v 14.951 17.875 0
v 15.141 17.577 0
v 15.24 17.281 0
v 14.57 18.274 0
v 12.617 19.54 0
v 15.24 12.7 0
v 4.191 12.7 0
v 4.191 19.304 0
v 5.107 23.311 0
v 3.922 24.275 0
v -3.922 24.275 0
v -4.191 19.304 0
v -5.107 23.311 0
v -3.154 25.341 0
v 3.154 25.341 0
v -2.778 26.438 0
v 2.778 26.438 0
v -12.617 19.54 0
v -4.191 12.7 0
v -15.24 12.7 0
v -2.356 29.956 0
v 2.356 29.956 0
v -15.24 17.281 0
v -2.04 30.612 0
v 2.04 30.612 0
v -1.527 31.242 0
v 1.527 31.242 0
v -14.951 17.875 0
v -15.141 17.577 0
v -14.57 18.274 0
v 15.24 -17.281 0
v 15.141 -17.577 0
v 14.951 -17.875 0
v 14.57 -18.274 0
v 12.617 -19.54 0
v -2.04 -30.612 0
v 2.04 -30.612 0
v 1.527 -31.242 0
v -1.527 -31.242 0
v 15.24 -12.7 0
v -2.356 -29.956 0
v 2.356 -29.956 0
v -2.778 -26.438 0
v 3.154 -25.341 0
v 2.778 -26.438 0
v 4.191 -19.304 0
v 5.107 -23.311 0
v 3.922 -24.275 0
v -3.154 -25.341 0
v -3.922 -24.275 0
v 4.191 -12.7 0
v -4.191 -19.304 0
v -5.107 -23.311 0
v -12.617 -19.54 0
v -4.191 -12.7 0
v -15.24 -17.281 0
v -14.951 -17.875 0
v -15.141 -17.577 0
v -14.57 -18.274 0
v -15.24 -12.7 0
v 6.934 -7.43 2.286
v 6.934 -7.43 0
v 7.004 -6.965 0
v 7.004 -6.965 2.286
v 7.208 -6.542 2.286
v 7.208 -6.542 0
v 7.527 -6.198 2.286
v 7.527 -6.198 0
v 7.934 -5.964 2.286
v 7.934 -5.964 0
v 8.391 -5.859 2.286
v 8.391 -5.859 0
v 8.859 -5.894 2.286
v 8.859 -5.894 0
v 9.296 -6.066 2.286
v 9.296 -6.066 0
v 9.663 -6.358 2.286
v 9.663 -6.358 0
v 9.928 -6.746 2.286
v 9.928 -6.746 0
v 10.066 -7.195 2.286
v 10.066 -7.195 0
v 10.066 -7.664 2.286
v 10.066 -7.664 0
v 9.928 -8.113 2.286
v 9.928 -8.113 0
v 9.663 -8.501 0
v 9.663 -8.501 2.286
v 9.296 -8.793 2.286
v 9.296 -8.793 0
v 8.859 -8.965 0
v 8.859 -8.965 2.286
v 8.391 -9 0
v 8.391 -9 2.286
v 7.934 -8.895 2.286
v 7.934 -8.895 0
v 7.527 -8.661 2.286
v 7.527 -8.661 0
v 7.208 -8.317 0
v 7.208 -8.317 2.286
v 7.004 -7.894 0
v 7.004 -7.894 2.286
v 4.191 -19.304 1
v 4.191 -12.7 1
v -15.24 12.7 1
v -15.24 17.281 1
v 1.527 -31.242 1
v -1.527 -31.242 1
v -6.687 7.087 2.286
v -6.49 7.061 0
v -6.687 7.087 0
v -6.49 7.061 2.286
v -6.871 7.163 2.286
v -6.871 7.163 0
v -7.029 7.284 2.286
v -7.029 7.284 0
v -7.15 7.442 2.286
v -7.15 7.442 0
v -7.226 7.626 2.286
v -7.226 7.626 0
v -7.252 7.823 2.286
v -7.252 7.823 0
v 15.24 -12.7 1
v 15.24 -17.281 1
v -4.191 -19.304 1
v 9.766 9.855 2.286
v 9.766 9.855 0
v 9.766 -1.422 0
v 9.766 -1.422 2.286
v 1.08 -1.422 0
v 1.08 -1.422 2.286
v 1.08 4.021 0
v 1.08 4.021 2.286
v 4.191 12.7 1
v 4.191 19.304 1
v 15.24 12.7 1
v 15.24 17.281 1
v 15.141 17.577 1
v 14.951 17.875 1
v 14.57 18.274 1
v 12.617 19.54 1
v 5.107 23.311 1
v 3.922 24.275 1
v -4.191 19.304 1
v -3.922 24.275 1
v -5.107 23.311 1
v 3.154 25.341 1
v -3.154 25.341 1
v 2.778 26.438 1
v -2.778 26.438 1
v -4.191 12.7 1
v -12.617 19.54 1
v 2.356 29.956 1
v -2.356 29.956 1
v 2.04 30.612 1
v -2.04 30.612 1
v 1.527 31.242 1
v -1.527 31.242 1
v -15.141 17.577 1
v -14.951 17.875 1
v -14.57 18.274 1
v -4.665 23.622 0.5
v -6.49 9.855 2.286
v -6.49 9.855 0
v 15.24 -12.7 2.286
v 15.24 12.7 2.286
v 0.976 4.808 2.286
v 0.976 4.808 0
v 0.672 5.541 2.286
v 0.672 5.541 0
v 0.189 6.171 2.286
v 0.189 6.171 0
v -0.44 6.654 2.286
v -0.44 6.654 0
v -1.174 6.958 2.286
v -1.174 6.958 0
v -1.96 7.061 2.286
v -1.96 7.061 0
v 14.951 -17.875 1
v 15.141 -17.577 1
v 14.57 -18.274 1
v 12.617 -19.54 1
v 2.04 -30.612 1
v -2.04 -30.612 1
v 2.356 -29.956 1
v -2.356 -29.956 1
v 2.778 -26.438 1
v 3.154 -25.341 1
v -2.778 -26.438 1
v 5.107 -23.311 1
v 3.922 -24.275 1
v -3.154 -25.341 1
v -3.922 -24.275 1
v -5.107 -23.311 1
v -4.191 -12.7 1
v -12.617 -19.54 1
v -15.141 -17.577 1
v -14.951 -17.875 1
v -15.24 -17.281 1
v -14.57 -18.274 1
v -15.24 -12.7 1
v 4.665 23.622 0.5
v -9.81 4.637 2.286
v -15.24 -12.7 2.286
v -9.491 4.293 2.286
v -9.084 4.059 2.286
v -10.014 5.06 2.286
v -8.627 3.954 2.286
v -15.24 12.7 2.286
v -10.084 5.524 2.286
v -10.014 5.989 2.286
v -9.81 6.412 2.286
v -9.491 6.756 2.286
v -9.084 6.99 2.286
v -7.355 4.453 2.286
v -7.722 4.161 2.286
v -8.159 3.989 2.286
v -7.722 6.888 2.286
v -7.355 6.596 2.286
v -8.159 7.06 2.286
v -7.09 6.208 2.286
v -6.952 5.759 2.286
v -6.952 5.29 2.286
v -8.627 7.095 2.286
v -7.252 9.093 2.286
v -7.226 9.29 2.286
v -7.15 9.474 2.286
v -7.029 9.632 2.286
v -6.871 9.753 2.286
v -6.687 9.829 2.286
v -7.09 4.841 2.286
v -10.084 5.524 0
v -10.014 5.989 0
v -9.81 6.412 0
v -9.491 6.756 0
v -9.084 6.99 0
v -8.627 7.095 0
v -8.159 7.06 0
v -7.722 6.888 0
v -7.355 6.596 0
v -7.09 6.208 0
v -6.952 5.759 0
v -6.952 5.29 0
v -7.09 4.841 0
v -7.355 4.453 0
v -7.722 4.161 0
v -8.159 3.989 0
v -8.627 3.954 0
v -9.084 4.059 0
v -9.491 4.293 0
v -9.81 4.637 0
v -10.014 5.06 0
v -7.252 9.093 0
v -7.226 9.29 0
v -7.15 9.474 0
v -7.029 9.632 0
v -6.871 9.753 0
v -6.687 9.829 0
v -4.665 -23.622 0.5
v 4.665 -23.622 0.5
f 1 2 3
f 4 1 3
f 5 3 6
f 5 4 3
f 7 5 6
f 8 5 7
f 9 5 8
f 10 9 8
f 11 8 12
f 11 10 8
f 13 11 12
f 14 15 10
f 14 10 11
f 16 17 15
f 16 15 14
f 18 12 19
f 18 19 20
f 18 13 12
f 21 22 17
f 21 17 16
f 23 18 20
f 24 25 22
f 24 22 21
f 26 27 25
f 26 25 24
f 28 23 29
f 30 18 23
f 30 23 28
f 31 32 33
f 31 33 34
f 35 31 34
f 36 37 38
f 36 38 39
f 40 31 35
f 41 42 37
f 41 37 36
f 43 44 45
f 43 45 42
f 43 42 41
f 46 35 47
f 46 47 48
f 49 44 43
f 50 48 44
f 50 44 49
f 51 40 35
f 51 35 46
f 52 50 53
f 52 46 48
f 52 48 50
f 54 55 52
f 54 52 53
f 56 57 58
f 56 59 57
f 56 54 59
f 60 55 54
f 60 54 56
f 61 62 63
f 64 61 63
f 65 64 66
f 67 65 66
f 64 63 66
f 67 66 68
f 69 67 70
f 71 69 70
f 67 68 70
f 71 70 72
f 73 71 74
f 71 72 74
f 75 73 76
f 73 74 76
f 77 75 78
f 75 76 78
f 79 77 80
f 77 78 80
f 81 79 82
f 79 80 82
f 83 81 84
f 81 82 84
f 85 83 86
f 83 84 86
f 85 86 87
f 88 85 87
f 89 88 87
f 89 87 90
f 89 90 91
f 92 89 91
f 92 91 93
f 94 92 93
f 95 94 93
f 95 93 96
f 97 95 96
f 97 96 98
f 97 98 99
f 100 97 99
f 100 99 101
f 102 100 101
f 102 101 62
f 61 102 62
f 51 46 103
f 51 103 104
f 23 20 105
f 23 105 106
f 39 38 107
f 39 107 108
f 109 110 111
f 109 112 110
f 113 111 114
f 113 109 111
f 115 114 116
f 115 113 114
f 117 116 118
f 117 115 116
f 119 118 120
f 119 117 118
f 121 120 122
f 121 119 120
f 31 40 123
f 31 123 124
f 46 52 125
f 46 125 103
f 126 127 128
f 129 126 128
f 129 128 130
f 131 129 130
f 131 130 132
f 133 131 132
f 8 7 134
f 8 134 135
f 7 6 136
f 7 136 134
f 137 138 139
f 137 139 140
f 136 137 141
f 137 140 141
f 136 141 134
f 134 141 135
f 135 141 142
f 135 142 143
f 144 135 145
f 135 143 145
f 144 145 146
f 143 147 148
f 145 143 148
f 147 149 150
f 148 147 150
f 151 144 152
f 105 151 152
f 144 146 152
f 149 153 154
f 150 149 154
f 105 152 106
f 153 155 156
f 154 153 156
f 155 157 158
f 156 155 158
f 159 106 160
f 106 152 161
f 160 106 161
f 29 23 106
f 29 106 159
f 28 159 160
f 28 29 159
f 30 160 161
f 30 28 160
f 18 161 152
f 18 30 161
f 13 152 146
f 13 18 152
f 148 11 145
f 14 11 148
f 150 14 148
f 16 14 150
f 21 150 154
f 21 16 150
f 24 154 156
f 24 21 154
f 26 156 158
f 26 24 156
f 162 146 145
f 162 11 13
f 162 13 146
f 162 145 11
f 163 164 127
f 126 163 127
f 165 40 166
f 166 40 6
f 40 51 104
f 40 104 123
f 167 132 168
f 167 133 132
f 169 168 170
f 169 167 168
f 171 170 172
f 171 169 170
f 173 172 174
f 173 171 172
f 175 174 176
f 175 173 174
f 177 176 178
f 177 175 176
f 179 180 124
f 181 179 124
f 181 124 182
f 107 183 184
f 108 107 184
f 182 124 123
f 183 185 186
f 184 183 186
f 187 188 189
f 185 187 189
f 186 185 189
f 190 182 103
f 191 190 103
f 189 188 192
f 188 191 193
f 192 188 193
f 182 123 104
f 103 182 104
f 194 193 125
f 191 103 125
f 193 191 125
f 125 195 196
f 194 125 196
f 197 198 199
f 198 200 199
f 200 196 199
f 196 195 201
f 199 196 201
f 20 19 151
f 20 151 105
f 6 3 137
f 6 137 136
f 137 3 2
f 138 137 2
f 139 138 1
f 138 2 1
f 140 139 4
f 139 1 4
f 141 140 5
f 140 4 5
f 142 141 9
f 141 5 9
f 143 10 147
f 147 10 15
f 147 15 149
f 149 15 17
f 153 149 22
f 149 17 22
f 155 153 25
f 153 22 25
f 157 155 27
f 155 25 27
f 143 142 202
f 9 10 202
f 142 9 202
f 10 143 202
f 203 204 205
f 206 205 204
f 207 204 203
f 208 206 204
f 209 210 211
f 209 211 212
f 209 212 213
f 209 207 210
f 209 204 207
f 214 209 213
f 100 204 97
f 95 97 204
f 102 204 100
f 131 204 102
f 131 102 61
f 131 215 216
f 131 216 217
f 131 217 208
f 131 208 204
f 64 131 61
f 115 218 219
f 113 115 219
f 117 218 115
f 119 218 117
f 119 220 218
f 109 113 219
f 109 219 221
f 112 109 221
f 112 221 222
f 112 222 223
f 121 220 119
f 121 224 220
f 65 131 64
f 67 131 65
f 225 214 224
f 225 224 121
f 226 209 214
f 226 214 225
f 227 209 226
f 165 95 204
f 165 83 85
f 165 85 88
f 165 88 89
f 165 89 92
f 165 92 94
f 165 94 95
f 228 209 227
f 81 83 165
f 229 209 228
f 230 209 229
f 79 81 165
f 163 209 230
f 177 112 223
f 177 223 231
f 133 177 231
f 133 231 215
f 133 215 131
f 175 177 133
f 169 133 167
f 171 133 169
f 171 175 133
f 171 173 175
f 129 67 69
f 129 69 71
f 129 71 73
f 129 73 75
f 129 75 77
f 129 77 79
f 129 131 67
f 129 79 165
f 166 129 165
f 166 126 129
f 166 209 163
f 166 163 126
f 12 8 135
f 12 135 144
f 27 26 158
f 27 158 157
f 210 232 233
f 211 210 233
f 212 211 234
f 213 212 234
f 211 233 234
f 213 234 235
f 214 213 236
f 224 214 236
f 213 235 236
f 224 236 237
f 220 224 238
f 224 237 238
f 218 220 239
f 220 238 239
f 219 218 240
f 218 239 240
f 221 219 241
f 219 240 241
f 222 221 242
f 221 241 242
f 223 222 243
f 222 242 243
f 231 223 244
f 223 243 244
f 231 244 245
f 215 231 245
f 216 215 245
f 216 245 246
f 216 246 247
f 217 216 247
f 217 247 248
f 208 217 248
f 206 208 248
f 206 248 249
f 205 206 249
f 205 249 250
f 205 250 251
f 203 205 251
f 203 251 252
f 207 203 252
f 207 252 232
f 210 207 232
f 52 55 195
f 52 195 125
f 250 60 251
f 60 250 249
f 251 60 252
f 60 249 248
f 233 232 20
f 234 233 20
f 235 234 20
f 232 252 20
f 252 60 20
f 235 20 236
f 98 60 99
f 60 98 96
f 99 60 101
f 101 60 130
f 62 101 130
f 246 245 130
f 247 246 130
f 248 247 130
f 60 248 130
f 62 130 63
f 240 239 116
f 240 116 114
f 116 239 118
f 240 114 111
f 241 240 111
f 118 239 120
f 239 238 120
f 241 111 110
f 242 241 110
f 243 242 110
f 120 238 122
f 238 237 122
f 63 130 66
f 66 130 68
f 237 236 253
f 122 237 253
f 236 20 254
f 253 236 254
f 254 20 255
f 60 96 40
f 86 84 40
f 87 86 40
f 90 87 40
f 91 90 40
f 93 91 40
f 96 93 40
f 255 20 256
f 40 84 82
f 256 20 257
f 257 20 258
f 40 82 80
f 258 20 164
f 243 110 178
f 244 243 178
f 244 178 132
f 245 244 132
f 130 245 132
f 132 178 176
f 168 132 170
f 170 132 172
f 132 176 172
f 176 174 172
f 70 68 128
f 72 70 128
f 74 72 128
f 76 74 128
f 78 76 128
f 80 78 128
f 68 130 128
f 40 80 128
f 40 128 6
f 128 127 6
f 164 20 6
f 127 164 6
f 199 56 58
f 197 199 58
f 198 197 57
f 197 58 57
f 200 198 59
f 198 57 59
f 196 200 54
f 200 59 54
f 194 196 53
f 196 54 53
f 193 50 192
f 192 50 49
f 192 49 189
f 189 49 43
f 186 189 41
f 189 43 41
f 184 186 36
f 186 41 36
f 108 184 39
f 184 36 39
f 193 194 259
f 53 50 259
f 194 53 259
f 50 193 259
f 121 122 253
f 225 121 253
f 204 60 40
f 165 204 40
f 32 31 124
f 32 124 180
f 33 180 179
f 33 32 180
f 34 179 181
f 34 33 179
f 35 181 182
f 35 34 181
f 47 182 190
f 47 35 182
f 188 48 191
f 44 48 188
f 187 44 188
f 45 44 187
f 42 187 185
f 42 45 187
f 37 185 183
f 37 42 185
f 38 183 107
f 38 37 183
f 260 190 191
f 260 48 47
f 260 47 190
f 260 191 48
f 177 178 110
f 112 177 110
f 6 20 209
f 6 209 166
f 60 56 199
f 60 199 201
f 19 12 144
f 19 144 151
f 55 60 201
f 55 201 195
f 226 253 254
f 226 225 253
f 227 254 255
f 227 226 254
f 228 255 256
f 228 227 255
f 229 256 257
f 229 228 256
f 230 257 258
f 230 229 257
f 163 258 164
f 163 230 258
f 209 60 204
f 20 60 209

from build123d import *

# Parameters (mm, degrees)
SKETCH2_W             = 30.48
SKETCH2_H             = 25.4
BOSS_EXTRUDE1_DEPTH   = 2.286
CUT_EXTRUDE2_REACH    = 4.286
SKETCH3_R             = 1.5748
BOSS_EXTRUDE5_DEPTH   = 1
BOSS_EXTRUDE5_2_DEPTH = 1
CUT_EXTRUDE3_DEPTH    = 1
FILLET4_R             = 3.04
FILLET5_R             = 0.762


with BuildPart() as part:
    # Sketch2 → Boss-Extrude1 (new body)
    with BuildSketch(Plane.XY):
        Rectangle(SKETCH2_W, SKETCH2_H)
    extrude(amount=BOSS_EXTRUDE1_DEPTH)

    # Sketch3 → Cut-Extrude2 (cut, up to next)
    with BuildSketch(Plane(origin=(0, 0, 0), x_dir=(-1, 0, 0), z_dir=(0, 0, -1)), mode=Mode.PRIVATE) as cut_extrude2_sk1:
        Polygon((-9.7663, -1.4224), (-1.0795, -1.4224), (-1.0795, 7.0612), (7.2517, 7.0612), (7.2517, 9.8552), (-9.7663, 9.8552), align=None)
    cut_extrude2_tool1 = extrude(cut_extrude2_sk1.sketch, amount=-CUT_EXTRUDE2_REACH, mode=Mode.PRIVATE) & part.part
    add(cut_extrude2_tool1.solids().sort_by_distance((3.789271, 5.030776, 0))[0], mode=Mode.SUBTRACT)
    # Sketch3 → Cut-Extrude2 (cut, up to next)
    with BuildSketch(Plane(origin=(0, 0, 0), x_dir=(-1, 0, 0), z_dir=(0, 0, -1)), mode=Mode.PRIVATE) as cut_extrude2_sk2:
        with Locations((8.509, 5.5245)):
            Circle(SKETCH3_R)
    cut_extrude2_tool2 = extrude(cut_extrude2_sk2.sketch, amount=-CUT_EXTRUDE2_REACH, mode=Mode.PRIVATE) & part.part
    add(cut_extrude2_tool2.solids().sort_by_distance((-8.509, 5.5245, 0))[0], mode=Mode.SUBTRACT)
    # Sketch3 → Cut-Extrude2 (cut, up to next)
    with BuildSketch(Plane(origin=(0, 0, 0), x_dir=(-1, 0, 0), z_dir=(0, 0, -1)), mode=Mode.PRIVATE) as cut_extrude2_sk3:
        with Locations((-8.509, -7.4295)):
            Circle(SKETCH3_R)
    cut_extrude2_tool3 = extrude(cut_extrude2_sk3.sketch, amount=-CUT_EXTRUDE2_REACH, mode=Mode.PRIVATE) & part.part
    add(cut_extrude2_tool3.solids().sort_by_distance((8.509, -7.4295, 0))[0], mode=Mode.SUBTRACT)

    # Fillet4
    fillet4_edges = [part.edges().sort_by_distance(p)[0] for p in [
        (1.0795, 7.0612, 1.143),
    ]]
    fillet(fillet4_edges, radius=FILLET4_R)

    # Fillet5
    fillet5_edges = [part.edges().sort_by_distance(p)[0] for p in [
        (-7.2517, 9.8552, 1.143),
        (-7.2517, 7.0612, 1.143),
    ]]
    fillet(fillet5_edges, radius=FILLET5_R)


with BuildPart() as body_2:
    # Sketch5 → Boss-Extrude5 (new body)
    with BuildSketch(Plane(origin=(0, 0, 0), x_dir=(-1, 0, 0), z_dir=(0, 0, -1))):
        Polygon((-15.24, 12.7), (-4.191, 12.7), (-4.191, 19.304), (4.191, 19.304), (4.191, 12.7), (15.24, 12.7), (15.24, 31.242), (-15.24, 31.242), align=None)
    extrude(amount=-BOSS_EXTRUDE5_DEPTH)


with BuildPart() as body_3:
    # Sketch5 → Boss-Extrude5 2 (new body)
    with BuildSketch(Plane(origin=(0, 0, 0), x_dir=(-1, 0, 0), z_dir=(0, 0, -1))):
        Polygon((15.24, -12.7), (4.191, -12.7), (4.191, -19.304), (-4.191, -19.304), (-4.191, -12.7), (-15.24, -12.7), (-15.24, -31.242), (15.24, -31.242), align=None)
    extrude(amount=-BOSS_EXTRUDE5_2_DEPTH)


with BuildPart() as cut_extrude3_tool:
    # Sketch6 → Cut-Extrude3 (new body)
    with BuildSketch(Plane(origin=(0, 0, 0), x_dir=(-1, 0, 0), z_dir=(0, 0, -1))):
        with BuildLine():
            Line((15.24, -17.280759688), (15.24, -31.242))
            Line((15.24, -31.242), (1.526938678, -31.242))
            add(Edge.make_bspline(
                [(15.24, -17.280759688), (14.890369571, -19.309691675), (-1.001421423, -23.881680442), (3.798810701, -29.015705658), (1.526938678, -31.242)],
                knots=[0, 0, 0, 0, 0.458669995, 1, 1, 1, 1], degree=3))
        make_face()
        with BuildLine():
            Line((-15.24, -31.242), (-1.526938678, -31.242))
            add(Edge.make_bspline(
                [(-15.24, -17.280759688), (-14.890369571, -19.309691675), (1.001421423, -23.881680442), (-3.798810701, -29.015705658), (-1.526938678, -31.242)],
                knots=[0, 0, 0, 0, 0.458669995, 1, 1, 1, 1], degree=3))
            Line((-15.24, -17.280759688), (-15.24, -31.242))
        make_face()
        with BuildLine():
            Line((-15.24, 17.280759688), (-15.24, 31.242))
            Line((-15.24, 31.242), (-1.526938678, 31.242))
            add(Edge.make_bspline(
                [(-15.24, 17.280759688), (-14.890369571, 19.309691675), (1.001421423, 23.881680442), (-3.798810701, 29.015705658), (-1.526938678, 31.242)],
                knots=[0, 0, 0, 0, 0.458669995, 1, 1, 1, 1], degree=3))
        make_face()
        with BuildLine():
            Line((15.24, 31.242), (1.526938678, 31.242))
            add(Edge.make_bspline(
                [(15.24, 17.280759688), (14.890369571, 19.309691675), (-1.001421423, 23.881680442), (3.798810701, 29.015705658), (1.526938678, 31.242)],
                knots=[0, 0, 0, 0, 0.458669995, 1, 1, 1, 1], degree=3))
            Line((15.24, 17.280759688), (15.24, 31.242))
        make_face()
    extrude(amount=-CUT_EXTRUDE3_DEPTH)


with BuildPart() as body_2_1:
    add(body_2.part)

    # Cut-Extrude3: cut by cut_extrude3_tool
    add(cut_extrude3_tool.part, mode=Mode.SUBTRACT)


with BuildPart() as body_3_1:
    add(body_3.part)

    # Cut-Extrude3: cut by cut_extrude3_tool
    add(cut_extrude3_tool.part, mode=Mode.SUBTRACT)


solid = Compound([part.part, body_2_1.part, body_3_1.part])
